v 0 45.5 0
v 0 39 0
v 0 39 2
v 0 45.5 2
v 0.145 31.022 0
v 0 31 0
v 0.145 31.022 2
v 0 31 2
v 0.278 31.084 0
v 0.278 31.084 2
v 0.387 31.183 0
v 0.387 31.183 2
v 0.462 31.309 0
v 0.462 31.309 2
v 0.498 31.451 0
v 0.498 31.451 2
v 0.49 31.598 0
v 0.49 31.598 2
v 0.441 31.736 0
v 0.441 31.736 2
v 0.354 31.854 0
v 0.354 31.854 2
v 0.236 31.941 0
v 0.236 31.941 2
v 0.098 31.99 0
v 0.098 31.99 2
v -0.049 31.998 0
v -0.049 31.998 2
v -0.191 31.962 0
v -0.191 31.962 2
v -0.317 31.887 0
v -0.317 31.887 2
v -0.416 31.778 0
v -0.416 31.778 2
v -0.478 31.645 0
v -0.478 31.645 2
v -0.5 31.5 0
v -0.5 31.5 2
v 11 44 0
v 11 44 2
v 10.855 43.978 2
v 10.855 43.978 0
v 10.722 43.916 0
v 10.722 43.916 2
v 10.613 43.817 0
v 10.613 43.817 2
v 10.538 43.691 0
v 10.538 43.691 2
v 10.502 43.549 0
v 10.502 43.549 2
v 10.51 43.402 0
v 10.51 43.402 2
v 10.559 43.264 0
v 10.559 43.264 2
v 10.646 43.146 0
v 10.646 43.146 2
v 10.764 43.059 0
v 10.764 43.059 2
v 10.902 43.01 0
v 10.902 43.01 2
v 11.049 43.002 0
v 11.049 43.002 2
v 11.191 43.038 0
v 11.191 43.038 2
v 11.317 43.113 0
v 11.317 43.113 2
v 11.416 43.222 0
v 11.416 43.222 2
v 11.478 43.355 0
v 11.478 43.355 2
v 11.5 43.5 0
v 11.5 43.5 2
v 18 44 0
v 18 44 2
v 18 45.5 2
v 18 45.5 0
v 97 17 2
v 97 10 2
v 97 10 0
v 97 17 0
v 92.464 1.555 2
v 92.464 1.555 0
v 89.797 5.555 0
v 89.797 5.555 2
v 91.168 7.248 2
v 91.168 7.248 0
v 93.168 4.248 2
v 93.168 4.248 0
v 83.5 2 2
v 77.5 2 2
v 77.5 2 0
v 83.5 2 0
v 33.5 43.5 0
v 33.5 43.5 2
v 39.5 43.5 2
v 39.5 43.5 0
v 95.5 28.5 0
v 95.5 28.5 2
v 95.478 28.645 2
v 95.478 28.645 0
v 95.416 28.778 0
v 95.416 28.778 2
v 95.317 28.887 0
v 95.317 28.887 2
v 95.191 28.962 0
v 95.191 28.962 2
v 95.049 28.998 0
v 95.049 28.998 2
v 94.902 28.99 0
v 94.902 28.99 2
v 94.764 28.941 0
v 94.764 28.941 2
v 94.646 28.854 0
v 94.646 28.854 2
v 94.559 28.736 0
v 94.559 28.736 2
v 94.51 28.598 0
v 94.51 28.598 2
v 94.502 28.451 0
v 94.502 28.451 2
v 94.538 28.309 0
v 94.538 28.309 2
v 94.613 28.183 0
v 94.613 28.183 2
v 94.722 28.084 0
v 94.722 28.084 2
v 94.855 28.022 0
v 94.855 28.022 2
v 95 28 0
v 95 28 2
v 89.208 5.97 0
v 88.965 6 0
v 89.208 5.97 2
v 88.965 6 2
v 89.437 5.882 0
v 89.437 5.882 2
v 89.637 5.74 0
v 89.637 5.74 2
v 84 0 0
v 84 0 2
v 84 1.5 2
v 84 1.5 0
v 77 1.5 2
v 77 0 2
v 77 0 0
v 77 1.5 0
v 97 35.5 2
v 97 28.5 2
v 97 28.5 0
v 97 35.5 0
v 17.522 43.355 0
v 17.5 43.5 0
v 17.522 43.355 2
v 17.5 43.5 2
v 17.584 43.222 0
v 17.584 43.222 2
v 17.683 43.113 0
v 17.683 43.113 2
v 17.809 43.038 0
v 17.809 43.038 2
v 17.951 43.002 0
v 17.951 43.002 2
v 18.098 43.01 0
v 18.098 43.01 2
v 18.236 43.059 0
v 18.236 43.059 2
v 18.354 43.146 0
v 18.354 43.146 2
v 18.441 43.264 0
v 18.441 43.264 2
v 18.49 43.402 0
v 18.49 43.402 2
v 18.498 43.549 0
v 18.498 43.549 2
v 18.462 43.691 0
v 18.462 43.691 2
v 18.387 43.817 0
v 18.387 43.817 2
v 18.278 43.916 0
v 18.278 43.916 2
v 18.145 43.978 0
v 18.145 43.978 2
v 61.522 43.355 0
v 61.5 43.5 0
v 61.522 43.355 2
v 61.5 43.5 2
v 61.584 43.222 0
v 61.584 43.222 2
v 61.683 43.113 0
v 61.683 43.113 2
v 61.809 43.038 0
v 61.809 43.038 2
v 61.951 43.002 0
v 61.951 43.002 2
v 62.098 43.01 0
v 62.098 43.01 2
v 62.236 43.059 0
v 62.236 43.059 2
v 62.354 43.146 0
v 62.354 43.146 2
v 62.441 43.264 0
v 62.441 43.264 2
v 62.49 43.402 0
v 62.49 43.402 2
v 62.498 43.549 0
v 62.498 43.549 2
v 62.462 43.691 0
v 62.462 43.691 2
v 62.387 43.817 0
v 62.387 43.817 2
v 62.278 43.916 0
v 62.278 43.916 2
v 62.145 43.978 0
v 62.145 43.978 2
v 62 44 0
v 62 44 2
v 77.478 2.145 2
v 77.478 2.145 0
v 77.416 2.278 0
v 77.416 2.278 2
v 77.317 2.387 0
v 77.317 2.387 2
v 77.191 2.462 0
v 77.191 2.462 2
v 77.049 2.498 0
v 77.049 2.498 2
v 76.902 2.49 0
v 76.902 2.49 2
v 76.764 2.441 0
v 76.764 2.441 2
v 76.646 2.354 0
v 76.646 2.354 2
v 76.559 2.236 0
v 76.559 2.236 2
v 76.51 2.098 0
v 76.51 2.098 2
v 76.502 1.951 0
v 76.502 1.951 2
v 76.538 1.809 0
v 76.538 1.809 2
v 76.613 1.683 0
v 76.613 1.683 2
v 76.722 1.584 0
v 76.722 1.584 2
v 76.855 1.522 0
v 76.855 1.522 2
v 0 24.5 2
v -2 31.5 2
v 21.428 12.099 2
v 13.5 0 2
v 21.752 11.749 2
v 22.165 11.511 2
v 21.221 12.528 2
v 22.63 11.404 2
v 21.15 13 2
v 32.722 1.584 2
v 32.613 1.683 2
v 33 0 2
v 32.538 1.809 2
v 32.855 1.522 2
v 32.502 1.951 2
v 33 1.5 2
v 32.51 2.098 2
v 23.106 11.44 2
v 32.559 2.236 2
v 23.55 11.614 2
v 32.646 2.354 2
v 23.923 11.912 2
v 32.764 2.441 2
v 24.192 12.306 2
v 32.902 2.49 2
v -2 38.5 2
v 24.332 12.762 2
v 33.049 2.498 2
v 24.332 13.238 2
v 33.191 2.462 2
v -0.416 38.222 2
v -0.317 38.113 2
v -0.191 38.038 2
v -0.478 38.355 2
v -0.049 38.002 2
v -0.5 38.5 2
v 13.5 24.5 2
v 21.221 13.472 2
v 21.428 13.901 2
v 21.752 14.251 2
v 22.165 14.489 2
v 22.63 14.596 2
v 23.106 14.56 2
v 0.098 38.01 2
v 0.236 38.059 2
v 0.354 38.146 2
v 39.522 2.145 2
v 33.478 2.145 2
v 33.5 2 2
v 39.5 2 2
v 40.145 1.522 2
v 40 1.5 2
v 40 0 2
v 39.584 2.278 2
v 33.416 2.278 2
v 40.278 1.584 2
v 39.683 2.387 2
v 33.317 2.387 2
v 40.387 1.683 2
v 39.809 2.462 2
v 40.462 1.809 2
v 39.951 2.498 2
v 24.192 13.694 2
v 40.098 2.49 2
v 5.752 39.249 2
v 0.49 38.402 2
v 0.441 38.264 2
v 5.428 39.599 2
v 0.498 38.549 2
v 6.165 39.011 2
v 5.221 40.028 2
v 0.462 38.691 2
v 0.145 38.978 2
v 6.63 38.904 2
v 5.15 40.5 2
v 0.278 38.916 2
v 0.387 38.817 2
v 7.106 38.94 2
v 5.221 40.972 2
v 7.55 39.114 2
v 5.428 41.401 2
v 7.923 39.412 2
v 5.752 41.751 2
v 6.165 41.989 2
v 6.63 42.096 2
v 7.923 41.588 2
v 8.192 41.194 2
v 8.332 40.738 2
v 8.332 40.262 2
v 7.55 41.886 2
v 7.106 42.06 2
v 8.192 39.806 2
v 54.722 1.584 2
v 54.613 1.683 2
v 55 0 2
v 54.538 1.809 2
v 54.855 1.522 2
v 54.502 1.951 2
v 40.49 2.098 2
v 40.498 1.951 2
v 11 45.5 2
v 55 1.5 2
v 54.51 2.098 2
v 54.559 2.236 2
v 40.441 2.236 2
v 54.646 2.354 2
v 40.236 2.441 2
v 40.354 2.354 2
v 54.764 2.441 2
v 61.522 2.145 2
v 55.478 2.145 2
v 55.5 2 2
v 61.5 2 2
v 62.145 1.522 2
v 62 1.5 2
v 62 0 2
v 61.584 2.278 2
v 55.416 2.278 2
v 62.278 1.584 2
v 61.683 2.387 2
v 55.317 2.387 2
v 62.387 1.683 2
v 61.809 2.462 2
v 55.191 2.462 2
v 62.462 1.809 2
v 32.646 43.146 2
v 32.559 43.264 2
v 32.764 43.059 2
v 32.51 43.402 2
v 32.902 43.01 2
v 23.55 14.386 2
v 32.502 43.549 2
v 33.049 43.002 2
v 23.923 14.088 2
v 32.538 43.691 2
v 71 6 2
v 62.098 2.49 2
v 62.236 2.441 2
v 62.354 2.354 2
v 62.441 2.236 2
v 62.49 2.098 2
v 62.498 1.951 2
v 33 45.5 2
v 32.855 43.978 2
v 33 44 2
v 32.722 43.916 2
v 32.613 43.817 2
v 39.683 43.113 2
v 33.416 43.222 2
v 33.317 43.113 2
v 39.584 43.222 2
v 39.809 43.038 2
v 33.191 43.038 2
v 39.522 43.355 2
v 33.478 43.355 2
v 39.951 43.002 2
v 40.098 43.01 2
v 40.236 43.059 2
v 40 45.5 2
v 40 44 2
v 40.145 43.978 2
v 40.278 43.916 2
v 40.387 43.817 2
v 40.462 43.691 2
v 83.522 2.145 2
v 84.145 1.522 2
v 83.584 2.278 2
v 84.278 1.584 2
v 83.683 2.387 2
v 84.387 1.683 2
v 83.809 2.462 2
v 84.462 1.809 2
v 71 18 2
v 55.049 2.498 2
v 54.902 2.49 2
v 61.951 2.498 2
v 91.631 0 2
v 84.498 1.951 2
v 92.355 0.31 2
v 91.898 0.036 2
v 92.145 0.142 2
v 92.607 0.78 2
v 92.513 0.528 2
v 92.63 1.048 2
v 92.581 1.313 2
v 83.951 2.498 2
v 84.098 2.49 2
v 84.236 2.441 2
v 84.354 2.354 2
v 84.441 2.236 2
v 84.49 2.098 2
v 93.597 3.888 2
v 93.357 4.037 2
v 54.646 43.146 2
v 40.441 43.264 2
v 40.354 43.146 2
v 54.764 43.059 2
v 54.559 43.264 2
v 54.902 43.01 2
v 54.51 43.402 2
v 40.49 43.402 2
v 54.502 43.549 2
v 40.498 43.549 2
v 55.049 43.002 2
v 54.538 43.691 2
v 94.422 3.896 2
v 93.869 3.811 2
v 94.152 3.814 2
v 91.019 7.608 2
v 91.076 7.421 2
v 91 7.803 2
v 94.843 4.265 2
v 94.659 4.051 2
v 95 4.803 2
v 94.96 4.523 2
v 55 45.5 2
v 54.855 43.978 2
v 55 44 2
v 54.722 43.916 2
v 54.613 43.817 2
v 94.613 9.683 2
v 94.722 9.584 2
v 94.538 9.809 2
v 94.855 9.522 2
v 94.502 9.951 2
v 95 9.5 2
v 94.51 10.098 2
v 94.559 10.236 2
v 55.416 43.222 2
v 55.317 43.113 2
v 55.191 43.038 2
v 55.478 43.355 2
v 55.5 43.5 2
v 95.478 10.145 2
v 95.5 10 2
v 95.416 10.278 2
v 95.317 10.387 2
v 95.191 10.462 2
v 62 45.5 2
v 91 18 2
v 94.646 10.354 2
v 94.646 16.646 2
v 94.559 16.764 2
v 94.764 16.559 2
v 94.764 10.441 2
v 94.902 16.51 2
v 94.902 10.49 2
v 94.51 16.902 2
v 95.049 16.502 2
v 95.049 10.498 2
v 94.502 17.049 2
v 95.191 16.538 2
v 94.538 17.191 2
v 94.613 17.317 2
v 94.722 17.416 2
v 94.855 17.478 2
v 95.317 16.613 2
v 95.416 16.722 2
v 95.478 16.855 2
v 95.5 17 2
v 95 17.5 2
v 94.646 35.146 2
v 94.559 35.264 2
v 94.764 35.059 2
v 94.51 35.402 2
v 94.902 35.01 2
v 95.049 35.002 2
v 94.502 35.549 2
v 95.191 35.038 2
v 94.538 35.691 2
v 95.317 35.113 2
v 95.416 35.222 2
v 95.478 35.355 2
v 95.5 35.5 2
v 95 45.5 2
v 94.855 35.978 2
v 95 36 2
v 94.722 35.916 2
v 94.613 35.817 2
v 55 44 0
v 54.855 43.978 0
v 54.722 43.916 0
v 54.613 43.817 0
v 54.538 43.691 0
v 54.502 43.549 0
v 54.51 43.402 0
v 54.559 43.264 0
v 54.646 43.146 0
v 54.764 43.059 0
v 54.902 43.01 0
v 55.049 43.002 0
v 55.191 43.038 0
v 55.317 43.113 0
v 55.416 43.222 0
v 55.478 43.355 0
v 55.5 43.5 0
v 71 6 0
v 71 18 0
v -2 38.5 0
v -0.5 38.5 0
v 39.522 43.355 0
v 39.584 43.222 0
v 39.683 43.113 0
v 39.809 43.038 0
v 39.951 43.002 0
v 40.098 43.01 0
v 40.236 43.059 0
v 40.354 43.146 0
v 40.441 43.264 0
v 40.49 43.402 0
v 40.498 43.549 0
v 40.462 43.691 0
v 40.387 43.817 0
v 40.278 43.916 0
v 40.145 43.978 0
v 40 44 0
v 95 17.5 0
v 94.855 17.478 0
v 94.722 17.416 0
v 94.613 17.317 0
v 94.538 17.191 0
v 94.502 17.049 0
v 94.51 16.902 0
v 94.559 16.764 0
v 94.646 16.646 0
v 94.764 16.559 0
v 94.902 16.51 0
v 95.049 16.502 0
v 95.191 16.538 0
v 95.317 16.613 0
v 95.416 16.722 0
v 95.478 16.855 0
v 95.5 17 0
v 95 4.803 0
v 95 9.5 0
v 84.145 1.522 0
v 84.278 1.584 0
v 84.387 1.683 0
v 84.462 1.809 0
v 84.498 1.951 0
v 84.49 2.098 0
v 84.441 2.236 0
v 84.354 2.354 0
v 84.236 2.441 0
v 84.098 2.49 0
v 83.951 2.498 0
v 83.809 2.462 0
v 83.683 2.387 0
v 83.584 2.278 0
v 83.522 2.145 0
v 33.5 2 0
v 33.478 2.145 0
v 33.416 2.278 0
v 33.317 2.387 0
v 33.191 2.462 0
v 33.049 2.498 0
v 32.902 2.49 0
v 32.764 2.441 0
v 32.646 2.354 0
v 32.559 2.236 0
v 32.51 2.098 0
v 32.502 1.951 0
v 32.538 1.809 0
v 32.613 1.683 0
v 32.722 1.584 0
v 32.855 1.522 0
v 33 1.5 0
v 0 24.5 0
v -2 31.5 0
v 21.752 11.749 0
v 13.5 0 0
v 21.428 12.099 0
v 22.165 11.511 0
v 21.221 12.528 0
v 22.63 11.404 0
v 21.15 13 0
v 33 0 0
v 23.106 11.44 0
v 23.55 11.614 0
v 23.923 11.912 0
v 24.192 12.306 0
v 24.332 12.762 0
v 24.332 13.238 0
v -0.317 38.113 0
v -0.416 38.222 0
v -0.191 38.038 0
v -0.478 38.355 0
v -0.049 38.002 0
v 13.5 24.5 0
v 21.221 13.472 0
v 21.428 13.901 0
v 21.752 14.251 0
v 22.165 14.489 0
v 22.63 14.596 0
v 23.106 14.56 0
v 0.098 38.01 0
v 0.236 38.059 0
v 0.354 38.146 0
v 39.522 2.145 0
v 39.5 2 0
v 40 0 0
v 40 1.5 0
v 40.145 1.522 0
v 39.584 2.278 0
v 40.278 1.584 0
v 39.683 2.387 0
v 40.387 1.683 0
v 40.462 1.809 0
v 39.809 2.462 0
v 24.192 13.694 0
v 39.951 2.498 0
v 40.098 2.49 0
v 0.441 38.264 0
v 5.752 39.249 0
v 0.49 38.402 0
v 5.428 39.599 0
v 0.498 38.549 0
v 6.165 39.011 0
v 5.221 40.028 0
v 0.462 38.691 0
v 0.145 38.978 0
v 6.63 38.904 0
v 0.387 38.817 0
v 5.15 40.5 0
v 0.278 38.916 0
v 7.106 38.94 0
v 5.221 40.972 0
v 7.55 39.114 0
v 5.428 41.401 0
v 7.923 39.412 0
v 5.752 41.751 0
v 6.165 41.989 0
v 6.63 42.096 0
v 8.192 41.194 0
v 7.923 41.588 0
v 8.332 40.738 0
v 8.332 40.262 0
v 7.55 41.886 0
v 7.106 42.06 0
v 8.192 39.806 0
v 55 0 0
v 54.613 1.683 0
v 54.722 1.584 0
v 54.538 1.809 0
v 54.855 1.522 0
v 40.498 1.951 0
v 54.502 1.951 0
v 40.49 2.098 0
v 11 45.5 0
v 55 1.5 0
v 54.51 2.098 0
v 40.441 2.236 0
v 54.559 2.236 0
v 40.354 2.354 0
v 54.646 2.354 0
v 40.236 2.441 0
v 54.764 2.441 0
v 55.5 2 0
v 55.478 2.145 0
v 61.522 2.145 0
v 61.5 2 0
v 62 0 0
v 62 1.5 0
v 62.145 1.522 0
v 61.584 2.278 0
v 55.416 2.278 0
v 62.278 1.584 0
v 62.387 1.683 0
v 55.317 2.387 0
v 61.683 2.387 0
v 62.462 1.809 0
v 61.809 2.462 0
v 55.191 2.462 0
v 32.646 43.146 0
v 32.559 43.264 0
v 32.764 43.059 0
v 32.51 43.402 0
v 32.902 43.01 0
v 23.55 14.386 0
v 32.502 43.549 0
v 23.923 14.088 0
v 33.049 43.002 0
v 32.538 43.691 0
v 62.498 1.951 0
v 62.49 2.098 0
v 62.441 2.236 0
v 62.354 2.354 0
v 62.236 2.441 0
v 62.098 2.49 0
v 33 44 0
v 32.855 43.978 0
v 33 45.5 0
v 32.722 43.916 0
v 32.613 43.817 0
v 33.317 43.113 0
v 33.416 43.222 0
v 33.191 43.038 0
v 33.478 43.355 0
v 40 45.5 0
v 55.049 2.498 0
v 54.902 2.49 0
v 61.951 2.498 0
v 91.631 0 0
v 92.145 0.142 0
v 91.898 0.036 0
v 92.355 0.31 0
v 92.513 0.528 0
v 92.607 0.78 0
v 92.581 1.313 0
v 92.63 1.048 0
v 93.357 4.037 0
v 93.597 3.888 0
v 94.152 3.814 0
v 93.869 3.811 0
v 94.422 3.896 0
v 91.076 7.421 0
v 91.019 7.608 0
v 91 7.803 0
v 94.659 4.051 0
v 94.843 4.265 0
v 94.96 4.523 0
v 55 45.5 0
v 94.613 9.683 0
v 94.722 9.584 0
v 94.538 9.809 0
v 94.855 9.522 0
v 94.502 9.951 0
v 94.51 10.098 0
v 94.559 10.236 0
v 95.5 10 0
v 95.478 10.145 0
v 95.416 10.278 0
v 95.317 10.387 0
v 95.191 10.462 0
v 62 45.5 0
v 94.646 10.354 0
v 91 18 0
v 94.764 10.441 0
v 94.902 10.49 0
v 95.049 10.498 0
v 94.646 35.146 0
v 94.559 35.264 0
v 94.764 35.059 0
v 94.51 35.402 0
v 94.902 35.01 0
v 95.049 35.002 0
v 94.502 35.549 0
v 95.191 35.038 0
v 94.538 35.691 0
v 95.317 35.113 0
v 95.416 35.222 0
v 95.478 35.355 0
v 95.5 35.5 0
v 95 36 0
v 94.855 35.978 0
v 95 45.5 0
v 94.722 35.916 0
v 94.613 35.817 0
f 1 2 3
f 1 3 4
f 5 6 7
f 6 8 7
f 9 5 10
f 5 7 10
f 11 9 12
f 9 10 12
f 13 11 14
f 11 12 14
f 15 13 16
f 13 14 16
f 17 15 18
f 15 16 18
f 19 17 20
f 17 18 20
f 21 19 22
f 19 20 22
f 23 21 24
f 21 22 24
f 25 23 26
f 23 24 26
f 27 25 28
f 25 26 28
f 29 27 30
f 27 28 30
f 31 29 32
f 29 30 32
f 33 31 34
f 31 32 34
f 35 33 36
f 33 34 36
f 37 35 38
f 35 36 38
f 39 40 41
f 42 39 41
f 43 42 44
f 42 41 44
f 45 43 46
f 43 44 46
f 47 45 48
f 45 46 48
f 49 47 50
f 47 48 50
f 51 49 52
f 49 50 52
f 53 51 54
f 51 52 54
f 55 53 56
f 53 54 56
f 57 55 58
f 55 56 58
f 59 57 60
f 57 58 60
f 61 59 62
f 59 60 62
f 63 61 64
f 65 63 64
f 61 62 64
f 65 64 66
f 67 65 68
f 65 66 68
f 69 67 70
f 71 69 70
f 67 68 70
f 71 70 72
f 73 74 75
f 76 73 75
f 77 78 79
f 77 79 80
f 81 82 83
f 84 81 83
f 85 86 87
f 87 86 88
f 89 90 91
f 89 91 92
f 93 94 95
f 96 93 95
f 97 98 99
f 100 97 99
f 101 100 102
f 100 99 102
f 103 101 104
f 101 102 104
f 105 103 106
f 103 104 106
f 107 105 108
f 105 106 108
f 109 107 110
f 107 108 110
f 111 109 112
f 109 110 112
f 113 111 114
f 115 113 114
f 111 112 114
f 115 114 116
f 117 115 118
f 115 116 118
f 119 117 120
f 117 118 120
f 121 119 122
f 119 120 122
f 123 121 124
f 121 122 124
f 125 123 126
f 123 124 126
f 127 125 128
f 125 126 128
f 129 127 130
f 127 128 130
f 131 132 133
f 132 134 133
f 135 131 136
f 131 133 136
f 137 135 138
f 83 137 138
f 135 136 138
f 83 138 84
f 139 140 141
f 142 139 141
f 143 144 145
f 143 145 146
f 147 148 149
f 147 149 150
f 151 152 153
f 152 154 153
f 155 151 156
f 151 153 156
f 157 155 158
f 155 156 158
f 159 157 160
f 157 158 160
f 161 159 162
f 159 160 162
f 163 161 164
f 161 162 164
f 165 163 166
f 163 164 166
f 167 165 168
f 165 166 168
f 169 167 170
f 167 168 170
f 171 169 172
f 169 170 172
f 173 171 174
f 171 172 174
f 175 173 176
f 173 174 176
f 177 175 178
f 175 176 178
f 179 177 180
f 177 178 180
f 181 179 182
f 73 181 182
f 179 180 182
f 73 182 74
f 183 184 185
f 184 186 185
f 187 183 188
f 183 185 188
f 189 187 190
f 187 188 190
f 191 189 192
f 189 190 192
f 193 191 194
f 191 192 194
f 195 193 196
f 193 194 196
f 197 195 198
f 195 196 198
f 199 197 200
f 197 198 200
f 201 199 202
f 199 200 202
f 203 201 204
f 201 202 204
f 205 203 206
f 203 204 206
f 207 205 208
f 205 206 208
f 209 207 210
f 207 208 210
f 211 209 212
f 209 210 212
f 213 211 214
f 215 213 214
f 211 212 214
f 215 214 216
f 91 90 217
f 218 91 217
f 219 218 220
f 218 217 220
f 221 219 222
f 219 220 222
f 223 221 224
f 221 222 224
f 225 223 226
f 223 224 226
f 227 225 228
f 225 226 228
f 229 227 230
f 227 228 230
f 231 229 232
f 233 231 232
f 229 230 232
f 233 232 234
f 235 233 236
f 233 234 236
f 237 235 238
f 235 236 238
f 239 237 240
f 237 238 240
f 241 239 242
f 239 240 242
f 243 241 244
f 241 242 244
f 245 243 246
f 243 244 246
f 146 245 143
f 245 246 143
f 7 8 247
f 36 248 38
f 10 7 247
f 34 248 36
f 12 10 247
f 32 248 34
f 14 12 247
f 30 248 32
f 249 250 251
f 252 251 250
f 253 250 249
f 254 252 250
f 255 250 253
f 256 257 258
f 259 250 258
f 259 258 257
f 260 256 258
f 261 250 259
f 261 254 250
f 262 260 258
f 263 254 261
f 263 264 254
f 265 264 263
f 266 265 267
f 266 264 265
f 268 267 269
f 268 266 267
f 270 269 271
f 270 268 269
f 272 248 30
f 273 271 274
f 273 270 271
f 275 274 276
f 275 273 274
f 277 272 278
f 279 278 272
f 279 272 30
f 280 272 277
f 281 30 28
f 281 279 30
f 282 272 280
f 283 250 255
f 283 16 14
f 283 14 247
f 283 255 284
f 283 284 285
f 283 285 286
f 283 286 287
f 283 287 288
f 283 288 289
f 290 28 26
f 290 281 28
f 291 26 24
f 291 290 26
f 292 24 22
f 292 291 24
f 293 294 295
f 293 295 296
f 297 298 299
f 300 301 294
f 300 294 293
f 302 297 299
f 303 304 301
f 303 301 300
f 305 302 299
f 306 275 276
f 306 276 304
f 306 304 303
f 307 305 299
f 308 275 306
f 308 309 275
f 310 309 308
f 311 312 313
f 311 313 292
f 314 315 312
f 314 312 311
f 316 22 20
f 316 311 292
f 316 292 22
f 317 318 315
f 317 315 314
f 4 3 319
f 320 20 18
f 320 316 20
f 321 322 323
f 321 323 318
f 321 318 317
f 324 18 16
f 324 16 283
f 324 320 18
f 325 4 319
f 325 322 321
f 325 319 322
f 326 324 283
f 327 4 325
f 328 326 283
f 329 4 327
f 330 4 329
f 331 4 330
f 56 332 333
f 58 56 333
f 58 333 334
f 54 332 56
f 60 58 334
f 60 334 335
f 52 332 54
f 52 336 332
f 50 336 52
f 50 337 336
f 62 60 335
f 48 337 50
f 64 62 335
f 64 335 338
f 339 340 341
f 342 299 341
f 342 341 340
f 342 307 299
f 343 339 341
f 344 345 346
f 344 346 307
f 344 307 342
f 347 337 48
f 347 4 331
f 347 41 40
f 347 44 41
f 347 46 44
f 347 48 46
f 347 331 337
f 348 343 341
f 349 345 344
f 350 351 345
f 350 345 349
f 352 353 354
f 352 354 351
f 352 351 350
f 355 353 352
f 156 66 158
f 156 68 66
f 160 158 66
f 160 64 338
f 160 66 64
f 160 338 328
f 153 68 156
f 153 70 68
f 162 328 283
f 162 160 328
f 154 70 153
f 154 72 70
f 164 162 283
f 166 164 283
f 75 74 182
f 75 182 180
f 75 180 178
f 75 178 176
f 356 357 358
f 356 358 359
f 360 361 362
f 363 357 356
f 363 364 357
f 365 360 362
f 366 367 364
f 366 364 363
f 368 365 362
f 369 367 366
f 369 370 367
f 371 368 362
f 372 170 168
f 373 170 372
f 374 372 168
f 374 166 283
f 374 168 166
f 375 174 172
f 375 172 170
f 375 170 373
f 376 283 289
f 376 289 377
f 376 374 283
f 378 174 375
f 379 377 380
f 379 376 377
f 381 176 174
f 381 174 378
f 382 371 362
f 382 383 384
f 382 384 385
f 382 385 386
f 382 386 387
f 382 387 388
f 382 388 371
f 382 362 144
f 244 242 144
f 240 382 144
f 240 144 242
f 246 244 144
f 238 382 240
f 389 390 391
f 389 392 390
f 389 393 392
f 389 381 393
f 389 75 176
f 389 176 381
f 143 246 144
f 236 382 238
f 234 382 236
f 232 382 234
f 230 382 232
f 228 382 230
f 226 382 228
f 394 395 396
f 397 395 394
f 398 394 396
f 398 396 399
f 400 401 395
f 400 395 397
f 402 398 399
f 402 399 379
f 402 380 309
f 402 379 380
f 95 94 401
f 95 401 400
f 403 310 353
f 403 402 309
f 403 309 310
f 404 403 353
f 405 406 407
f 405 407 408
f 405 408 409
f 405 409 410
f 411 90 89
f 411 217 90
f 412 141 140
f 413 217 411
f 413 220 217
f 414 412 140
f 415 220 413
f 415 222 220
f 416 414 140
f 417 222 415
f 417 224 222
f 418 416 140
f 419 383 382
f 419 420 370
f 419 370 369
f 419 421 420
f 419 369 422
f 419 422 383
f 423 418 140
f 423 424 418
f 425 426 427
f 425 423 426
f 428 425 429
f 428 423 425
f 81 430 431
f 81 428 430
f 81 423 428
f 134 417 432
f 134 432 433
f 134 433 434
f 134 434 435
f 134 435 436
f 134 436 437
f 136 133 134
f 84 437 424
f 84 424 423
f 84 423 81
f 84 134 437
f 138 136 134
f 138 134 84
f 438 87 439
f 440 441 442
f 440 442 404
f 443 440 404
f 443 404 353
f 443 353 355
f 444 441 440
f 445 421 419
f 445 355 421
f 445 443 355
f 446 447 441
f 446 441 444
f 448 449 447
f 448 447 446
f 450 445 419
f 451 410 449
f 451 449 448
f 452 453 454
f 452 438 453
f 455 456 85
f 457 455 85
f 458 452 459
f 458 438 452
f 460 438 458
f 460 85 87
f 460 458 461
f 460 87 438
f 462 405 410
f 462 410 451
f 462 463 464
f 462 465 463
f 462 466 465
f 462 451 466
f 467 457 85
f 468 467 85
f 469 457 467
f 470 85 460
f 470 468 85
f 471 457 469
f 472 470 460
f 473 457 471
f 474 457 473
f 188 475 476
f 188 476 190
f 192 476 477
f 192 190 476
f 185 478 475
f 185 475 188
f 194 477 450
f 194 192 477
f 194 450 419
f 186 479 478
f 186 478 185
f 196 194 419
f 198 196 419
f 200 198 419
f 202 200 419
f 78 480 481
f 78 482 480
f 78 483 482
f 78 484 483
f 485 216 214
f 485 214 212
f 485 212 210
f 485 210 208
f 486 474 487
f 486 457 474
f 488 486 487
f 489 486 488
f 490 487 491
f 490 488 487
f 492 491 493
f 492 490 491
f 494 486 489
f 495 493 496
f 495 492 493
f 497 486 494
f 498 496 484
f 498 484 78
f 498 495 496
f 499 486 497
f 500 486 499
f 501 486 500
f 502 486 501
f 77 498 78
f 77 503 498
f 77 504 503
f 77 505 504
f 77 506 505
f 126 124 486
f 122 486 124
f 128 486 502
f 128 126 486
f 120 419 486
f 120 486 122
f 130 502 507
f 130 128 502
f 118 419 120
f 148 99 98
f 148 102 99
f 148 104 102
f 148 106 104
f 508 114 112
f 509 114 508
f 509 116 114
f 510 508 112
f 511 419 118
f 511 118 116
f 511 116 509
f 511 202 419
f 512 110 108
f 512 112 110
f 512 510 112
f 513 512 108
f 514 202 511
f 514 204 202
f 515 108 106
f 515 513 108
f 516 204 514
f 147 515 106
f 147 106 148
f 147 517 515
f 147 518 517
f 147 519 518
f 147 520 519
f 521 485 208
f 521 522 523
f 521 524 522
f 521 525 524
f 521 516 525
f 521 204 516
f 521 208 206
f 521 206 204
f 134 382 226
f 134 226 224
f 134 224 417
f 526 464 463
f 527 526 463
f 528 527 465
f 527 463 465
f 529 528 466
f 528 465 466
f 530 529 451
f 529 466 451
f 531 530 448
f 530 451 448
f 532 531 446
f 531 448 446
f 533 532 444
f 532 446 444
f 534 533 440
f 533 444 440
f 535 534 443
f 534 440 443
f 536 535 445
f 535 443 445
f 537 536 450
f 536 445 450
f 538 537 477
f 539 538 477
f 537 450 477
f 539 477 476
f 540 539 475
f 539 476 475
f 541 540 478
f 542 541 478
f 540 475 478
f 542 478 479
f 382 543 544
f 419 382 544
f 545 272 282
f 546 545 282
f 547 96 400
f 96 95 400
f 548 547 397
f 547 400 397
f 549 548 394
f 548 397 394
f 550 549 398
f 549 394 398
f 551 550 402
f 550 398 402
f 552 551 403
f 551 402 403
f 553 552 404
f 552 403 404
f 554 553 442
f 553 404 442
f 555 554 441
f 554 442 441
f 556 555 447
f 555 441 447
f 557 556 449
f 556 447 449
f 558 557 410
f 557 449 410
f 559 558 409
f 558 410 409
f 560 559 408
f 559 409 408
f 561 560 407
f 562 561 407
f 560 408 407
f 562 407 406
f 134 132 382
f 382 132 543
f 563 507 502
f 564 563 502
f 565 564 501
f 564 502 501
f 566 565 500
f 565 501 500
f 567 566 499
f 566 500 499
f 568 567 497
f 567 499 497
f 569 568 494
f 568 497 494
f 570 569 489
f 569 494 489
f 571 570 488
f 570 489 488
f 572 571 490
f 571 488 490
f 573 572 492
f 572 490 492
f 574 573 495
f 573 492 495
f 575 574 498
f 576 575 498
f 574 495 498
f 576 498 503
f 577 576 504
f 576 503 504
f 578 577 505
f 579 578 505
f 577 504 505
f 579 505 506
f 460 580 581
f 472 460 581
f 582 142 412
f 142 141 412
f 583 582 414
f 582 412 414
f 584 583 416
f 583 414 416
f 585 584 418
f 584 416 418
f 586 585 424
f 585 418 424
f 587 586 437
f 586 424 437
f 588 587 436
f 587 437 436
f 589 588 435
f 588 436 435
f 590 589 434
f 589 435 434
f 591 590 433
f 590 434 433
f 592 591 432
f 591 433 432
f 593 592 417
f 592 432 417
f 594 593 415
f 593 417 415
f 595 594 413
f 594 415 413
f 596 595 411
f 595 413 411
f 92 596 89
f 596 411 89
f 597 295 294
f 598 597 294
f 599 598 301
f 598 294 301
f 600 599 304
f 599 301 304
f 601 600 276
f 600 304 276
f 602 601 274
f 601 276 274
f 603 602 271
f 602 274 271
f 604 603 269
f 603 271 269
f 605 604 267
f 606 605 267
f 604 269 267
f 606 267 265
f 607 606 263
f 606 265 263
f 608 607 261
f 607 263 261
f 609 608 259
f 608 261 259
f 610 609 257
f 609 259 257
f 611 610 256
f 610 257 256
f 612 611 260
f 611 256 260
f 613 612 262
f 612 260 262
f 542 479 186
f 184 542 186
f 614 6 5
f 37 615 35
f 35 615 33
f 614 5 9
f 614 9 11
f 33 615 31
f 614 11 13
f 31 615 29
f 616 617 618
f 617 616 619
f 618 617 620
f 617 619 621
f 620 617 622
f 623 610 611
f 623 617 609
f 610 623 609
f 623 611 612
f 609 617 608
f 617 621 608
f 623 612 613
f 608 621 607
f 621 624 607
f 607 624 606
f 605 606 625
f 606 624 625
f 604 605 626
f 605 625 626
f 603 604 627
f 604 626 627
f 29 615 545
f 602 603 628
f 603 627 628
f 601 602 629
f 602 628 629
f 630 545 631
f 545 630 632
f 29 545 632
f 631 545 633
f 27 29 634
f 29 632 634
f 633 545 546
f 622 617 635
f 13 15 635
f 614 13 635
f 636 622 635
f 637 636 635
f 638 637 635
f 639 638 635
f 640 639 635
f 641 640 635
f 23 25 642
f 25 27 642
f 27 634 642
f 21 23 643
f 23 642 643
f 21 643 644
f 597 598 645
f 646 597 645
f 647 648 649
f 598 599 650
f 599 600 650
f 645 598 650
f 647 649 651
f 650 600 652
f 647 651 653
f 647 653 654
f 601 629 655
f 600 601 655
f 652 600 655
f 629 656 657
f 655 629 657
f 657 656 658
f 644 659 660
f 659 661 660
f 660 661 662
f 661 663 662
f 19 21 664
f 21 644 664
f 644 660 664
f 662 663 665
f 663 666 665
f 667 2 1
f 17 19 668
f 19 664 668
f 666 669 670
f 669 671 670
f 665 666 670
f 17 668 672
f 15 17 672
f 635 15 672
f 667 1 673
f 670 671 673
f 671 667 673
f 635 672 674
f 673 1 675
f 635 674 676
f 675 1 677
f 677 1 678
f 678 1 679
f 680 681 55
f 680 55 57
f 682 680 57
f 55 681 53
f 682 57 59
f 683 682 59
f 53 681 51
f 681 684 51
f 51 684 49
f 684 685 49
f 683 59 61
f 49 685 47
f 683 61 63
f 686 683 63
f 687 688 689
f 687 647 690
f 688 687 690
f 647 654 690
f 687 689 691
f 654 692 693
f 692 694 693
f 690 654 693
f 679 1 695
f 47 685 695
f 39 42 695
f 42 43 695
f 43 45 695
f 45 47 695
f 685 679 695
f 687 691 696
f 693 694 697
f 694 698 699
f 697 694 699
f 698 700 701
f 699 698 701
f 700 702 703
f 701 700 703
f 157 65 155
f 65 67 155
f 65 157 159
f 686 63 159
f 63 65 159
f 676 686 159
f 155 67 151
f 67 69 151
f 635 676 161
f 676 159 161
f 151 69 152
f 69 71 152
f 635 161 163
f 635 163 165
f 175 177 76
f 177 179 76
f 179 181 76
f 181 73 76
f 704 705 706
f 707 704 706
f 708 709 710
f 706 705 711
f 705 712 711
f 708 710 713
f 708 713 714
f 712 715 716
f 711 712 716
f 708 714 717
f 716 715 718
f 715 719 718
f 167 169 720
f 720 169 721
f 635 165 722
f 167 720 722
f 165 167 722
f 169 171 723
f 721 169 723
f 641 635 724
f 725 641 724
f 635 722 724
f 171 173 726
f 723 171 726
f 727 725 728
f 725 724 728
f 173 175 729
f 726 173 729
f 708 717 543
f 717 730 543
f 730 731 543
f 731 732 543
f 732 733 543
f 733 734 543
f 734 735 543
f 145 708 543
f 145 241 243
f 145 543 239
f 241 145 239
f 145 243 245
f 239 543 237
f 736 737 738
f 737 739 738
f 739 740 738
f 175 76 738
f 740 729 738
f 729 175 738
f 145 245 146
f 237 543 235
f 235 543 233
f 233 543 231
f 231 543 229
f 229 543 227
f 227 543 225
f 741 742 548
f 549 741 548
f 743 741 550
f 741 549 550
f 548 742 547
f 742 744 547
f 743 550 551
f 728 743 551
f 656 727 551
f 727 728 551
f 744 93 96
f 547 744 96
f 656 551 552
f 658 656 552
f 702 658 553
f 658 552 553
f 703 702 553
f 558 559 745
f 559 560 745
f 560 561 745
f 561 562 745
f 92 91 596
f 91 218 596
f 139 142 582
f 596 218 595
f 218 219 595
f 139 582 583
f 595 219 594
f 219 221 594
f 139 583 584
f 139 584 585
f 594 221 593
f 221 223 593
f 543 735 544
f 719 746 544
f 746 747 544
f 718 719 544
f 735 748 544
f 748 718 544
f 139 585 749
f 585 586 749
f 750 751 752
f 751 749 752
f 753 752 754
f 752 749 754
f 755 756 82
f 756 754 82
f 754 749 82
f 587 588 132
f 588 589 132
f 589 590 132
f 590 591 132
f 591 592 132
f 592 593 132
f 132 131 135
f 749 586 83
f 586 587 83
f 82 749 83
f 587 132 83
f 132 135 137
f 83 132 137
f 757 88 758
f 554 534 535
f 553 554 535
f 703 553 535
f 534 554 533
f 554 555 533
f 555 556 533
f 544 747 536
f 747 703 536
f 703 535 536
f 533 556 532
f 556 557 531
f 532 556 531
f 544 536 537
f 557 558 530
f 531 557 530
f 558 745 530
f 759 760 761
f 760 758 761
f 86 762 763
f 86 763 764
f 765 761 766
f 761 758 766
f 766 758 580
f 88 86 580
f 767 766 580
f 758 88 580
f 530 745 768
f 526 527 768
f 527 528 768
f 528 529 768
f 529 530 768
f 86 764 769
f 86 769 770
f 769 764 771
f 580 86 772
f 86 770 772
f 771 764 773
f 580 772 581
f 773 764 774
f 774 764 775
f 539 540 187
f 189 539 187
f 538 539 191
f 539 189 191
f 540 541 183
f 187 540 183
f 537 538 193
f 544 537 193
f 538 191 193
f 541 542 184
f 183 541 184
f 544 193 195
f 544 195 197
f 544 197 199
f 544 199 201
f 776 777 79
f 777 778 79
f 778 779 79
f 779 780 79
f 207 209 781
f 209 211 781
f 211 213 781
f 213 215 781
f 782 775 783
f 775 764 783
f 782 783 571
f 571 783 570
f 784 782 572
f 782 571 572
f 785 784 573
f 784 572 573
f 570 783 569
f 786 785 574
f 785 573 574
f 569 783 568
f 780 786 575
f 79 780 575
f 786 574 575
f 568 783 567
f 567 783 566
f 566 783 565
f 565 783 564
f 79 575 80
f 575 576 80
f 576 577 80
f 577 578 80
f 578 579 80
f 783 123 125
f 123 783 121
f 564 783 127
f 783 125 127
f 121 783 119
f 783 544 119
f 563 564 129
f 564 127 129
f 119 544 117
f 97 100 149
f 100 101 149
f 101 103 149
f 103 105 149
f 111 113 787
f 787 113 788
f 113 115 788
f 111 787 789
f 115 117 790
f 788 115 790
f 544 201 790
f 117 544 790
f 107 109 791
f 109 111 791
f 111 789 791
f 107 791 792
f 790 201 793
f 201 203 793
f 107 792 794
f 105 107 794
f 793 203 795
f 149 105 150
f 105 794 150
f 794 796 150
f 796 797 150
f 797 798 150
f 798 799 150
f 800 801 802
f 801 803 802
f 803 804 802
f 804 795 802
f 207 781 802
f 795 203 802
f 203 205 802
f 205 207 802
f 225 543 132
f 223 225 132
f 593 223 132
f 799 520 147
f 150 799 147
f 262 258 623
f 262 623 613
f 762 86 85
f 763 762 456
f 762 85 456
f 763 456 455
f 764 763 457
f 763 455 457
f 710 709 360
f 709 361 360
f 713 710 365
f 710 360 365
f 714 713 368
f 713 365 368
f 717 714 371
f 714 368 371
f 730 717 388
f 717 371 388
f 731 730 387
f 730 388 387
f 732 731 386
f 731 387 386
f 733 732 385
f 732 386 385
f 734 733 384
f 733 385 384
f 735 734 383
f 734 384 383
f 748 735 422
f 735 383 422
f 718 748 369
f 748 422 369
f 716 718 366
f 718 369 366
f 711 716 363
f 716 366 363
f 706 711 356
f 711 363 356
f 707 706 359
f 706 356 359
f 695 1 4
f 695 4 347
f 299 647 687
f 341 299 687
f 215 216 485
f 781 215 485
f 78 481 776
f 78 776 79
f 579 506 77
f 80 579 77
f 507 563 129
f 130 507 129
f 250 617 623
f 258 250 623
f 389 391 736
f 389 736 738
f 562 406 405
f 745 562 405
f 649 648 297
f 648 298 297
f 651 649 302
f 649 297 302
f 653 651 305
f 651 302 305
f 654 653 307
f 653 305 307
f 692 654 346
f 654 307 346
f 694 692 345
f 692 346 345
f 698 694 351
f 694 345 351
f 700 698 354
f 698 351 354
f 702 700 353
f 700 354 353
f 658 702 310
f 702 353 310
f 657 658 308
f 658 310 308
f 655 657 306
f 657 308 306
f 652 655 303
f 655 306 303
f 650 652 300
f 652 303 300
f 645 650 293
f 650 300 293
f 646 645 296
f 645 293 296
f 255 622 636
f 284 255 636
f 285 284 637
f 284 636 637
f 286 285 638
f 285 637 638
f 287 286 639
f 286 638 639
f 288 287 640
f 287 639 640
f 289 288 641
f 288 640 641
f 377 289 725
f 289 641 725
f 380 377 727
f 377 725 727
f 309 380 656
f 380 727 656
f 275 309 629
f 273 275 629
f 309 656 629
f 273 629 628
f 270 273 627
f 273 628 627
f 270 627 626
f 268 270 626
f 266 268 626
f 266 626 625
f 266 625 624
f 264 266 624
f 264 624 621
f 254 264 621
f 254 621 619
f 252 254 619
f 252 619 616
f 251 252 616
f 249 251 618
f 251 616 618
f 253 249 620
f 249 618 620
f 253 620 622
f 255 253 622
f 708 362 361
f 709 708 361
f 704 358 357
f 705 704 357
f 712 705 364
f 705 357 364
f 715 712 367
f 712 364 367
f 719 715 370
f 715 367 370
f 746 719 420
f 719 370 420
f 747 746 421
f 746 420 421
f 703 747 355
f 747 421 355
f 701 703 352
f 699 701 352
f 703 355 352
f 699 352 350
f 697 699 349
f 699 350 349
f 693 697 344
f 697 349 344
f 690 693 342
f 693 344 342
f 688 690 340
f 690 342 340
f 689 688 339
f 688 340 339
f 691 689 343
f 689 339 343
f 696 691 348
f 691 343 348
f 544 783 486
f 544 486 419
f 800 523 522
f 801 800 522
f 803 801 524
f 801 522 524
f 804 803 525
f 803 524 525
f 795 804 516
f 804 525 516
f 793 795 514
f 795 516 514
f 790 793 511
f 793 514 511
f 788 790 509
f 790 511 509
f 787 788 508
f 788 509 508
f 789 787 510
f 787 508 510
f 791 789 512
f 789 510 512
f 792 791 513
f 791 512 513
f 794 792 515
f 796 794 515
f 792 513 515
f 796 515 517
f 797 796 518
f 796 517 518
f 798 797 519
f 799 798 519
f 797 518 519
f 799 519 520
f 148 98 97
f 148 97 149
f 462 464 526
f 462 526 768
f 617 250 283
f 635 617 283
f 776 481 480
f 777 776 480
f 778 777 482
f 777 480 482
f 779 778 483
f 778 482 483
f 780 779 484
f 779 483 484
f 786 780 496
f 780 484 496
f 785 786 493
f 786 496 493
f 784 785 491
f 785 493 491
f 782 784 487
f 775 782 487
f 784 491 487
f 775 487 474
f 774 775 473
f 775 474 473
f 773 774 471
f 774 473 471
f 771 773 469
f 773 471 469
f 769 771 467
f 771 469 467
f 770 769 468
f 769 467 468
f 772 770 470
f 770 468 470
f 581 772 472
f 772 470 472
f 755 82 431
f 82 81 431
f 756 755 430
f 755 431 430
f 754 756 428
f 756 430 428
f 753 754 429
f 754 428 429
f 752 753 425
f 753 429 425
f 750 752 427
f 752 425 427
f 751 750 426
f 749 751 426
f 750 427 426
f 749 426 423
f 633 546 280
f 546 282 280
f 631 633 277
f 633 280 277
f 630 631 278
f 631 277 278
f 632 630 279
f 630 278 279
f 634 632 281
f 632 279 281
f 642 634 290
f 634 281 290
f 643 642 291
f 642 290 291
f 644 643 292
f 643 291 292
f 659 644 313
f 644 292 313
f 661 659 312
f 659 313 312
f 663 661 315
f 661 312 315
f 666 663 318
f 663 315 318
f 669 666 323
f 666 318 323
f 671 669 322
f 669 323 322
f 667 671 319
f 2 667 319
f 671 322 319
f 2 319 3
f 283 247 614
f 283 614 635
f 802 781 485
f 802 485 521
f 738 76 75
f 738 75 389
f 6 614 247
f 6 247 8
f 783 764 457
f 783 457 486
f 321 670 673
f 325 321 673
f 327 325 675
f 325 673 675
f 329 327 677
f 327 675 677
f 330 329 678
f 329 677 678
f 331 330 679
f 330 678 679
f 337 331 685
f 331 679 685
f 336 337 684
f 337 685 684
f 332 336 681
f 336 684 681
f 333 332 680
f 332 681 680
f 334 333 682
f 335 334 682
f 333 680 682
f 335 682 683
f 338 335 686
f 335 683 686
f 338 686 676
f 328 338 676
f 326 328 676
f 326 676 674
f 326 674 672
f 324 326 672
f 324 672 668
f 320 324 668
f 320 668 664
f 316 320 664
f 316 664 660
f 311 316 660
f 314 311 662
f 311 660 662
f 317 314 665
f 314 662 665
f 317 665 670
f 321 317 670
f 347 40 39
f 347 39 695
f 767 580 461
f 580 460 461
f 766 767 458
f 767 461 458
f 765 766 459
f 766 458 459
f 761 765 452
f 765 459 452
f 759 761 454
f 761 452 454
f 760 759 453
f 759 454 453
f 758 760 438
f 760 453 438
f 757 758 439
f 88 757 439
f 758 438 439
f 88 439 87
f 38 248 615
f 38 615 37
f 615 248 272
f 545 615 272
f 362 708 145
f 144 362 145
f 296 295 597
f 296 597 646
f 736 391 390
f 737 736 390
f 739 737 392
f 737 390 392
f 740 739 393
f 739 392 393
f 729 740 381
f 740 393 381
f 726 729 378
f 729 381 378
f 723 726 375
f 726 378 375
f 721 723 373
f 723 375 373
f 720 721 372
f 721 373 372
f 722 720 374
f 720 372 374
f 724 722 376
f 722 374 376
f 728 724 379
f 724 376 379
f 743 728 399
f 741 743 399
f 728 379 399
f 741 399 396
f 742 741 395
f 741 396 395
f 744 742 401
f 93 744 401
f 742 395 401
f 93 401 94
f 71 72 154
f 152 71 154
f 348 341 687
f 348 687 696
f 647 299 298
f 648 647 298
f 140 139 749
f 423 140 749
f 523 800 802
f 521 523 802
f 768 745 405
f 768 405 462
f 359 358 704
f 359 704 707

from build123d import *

# Parameters (mm, degrees)
SKETCH_1_W          = 95
SKETCH_1_H          = 45.5
EXTRUDE_1_DEPTH     = 2
SKETCH_2_W          = 7
SKETCH_2_H          = 2
CUT_EXTRUDE_1_DEPTH = 106.352978126
SKETCH_3_R          = 0.5
CUT_EXTRUDE_2_DEPTH = 106.352978126
SKETCH_5_W          = 13.5
SKETCH_5_H          = 24.5
CUT_EXTRUDE_3_DEPTH = 106.352978126
SKETCH_6_W          = 2
SKETCH_6_H          = 7
EXTRUDE_2_DEPTH     = 2
SKETCH_7_W          = 20
SKETCH_7_H          = 12
CUT_EXTRUDE_4_DEPTH = 108.159927212
CUT_EXTRUDE_5_DEPTH = 108.159927212
FILLET_1_R          = 1
SKETCH_9_R          = 1.6
CUT_EXTRUDE_6_DEPTH = 2


with BuildPart() as part:
    # 草图1 → 凸台-拉伸1 (new body)
    with BuildSketch(Plane.XY):
        with Locations((47.5, 22.75)):
            Rectangle(SKETCH_1_W, SKETCH_1_H)
    extrude(amount=EXTRUDE_1_DEPTH)

    # 草图2 → 切除-拉伸1 (cut, through all)
    with BuildSketch(Plane.XY.offset(2)):
        with Locations((58.5, 44.5)):
            Rectangle(SKETCH_2_W, SKETCH_2_H)
        with Locations((36.5, 44.5)):
            Rectangle(SKETCH_2_W, SKETCH_2_H)
        with Locations((14.5, 44.5)):
            Rectangle(SKETCH_2_W, SKETCH_2_H)
        with Locations((36.5, 1)):
            Rectangle(SKETCH_2_W, SKETCH_2_H)
        with Locations((58.5, 1)):
            Rectangle(SKETCH_2_W, SKETCH_2_H)
        with Locations((80.5, 1)):
            Rectangle(SKETCH_2_W, SKETCH_2_H)
    extrude(amount=-CUT_EXTRUDE_1_DEPTH, mode=Mode.SUBTRACT)

    # 草图3 → 切除-拉伸2 (cut, through all)
    with BuildSketch(Plane.XY.offset(2)):
        with Locations((11, 43.5)):
            Circle(SKETCH_3_R)
    cut_extrude_2 = extrude(amount=-CUT_EXTRUDE_2_DEPTH, mode=Mode.SUBTRACT)

    # 草图5 → 切除-拉伸3 (cut, through all)
    with BuildSketch(Plane.XY.offset(2)):
        with Locations((6.75, 12.25)):
            Rectangle(SKETCH_5_W, SKETCH_5_H)
    extrude(amount=-CUT_EXTRUDE_3_DEPTH, mode=Mode.SUBTRACT)

    # 草图6 → 凸台-拉伸2 (add)
    with BuildSketch(Plane.XY.offset(2)):
        with Locations((-1, 35)):
            Rectangle(SKETCH_6_W, SKETCH_6_H)
        with Locations((96, 32)):
            Rectangle(SKETCH_6_W, SKETCH_6_H)
        with Locations((96, 13.5)):
            Rectangle(SKETCH_6_W, SKETCH_6_H)
    extrude(amount=-EXTRUDE_2_DEPTH)

    # 草图阵列1: 切除-拉伸2 at 17 more places
    with Locations((7, 0, 0), (22, 0, 0), (29, 0, 0), (44, 0, 0), (51, 0, 0), (73, -41.5, 0), (66, -41.5, 0), (51, -41.5, 0), (44, -41.5, 0), (29, -41.5, 0), (22, -41.5, 0), (-11, -12, 0), (84, -8, 0), (-11, -5, 0), (84, -15, 0), (84, -26.5, 0), (84, -33.5, 0)):
        add(cut_extrude_2, mode=Mode.SUBTRACT)

    # 草图7 → 切除-拉伸4 (cut, through all)
    with BuildSketch(Plane(origin=(0, 0, 0), x_dir=(-1, 0, 0), z_dir=(0, 0, -1))):
        with Locations((-81, 12)):
            Rectangle(SKETCH_7_W, SKETCH_7_H)
    extrude(amount=-CUT_EXTRUDE_4_DEPTH, mode=Mode.SUBTRACT)

    # 草图8 → 切除-拉伸5 (cut, through all)
    with BuildSketch(Plane(origin=(0, 0, 0), x_dir=(-1, 0, 0), z_dir=(0, 0, -1))):
        Polygon((-91, 7.5), (-95, 1.5), (-95, 0), (-93.5, 0), (-89.5, 6), (-91, 6), align=None)
    extrude(amount=-CUT_EXTRUDE_5_DEPTH, mode=Mode.SUBTRACT)

    # 圆角1
    fillet_1_edges = [part.edges().sort_by_distance(p)[0] for p in [
        (91, 7.5, 1),
        (89.5, 6, 1),
        (93.5, 0, 1),
        (95, 1.5, 1),
    ]]
    fillet(fillet_1_edges, radius=FILLET_1_R)

    # 草图9 → 切除-拉伸6 (cut)
    with BuildSketch(Plane(origin=(0, 0, 0), x_dir=(-1, 0, 0), z_dir=(0, 0, -1))):
        with Locations((-6.75, 40.5)):
            Circle(SKETCH_9_R)
        with Locations((-22.75, 13)):
            Circle(SKETCH_9_R)
    extrude(amount=-CUT_EXTRUDE_6_DEPTH, mode=Mode.SUBTRACT)


solid = part.part
